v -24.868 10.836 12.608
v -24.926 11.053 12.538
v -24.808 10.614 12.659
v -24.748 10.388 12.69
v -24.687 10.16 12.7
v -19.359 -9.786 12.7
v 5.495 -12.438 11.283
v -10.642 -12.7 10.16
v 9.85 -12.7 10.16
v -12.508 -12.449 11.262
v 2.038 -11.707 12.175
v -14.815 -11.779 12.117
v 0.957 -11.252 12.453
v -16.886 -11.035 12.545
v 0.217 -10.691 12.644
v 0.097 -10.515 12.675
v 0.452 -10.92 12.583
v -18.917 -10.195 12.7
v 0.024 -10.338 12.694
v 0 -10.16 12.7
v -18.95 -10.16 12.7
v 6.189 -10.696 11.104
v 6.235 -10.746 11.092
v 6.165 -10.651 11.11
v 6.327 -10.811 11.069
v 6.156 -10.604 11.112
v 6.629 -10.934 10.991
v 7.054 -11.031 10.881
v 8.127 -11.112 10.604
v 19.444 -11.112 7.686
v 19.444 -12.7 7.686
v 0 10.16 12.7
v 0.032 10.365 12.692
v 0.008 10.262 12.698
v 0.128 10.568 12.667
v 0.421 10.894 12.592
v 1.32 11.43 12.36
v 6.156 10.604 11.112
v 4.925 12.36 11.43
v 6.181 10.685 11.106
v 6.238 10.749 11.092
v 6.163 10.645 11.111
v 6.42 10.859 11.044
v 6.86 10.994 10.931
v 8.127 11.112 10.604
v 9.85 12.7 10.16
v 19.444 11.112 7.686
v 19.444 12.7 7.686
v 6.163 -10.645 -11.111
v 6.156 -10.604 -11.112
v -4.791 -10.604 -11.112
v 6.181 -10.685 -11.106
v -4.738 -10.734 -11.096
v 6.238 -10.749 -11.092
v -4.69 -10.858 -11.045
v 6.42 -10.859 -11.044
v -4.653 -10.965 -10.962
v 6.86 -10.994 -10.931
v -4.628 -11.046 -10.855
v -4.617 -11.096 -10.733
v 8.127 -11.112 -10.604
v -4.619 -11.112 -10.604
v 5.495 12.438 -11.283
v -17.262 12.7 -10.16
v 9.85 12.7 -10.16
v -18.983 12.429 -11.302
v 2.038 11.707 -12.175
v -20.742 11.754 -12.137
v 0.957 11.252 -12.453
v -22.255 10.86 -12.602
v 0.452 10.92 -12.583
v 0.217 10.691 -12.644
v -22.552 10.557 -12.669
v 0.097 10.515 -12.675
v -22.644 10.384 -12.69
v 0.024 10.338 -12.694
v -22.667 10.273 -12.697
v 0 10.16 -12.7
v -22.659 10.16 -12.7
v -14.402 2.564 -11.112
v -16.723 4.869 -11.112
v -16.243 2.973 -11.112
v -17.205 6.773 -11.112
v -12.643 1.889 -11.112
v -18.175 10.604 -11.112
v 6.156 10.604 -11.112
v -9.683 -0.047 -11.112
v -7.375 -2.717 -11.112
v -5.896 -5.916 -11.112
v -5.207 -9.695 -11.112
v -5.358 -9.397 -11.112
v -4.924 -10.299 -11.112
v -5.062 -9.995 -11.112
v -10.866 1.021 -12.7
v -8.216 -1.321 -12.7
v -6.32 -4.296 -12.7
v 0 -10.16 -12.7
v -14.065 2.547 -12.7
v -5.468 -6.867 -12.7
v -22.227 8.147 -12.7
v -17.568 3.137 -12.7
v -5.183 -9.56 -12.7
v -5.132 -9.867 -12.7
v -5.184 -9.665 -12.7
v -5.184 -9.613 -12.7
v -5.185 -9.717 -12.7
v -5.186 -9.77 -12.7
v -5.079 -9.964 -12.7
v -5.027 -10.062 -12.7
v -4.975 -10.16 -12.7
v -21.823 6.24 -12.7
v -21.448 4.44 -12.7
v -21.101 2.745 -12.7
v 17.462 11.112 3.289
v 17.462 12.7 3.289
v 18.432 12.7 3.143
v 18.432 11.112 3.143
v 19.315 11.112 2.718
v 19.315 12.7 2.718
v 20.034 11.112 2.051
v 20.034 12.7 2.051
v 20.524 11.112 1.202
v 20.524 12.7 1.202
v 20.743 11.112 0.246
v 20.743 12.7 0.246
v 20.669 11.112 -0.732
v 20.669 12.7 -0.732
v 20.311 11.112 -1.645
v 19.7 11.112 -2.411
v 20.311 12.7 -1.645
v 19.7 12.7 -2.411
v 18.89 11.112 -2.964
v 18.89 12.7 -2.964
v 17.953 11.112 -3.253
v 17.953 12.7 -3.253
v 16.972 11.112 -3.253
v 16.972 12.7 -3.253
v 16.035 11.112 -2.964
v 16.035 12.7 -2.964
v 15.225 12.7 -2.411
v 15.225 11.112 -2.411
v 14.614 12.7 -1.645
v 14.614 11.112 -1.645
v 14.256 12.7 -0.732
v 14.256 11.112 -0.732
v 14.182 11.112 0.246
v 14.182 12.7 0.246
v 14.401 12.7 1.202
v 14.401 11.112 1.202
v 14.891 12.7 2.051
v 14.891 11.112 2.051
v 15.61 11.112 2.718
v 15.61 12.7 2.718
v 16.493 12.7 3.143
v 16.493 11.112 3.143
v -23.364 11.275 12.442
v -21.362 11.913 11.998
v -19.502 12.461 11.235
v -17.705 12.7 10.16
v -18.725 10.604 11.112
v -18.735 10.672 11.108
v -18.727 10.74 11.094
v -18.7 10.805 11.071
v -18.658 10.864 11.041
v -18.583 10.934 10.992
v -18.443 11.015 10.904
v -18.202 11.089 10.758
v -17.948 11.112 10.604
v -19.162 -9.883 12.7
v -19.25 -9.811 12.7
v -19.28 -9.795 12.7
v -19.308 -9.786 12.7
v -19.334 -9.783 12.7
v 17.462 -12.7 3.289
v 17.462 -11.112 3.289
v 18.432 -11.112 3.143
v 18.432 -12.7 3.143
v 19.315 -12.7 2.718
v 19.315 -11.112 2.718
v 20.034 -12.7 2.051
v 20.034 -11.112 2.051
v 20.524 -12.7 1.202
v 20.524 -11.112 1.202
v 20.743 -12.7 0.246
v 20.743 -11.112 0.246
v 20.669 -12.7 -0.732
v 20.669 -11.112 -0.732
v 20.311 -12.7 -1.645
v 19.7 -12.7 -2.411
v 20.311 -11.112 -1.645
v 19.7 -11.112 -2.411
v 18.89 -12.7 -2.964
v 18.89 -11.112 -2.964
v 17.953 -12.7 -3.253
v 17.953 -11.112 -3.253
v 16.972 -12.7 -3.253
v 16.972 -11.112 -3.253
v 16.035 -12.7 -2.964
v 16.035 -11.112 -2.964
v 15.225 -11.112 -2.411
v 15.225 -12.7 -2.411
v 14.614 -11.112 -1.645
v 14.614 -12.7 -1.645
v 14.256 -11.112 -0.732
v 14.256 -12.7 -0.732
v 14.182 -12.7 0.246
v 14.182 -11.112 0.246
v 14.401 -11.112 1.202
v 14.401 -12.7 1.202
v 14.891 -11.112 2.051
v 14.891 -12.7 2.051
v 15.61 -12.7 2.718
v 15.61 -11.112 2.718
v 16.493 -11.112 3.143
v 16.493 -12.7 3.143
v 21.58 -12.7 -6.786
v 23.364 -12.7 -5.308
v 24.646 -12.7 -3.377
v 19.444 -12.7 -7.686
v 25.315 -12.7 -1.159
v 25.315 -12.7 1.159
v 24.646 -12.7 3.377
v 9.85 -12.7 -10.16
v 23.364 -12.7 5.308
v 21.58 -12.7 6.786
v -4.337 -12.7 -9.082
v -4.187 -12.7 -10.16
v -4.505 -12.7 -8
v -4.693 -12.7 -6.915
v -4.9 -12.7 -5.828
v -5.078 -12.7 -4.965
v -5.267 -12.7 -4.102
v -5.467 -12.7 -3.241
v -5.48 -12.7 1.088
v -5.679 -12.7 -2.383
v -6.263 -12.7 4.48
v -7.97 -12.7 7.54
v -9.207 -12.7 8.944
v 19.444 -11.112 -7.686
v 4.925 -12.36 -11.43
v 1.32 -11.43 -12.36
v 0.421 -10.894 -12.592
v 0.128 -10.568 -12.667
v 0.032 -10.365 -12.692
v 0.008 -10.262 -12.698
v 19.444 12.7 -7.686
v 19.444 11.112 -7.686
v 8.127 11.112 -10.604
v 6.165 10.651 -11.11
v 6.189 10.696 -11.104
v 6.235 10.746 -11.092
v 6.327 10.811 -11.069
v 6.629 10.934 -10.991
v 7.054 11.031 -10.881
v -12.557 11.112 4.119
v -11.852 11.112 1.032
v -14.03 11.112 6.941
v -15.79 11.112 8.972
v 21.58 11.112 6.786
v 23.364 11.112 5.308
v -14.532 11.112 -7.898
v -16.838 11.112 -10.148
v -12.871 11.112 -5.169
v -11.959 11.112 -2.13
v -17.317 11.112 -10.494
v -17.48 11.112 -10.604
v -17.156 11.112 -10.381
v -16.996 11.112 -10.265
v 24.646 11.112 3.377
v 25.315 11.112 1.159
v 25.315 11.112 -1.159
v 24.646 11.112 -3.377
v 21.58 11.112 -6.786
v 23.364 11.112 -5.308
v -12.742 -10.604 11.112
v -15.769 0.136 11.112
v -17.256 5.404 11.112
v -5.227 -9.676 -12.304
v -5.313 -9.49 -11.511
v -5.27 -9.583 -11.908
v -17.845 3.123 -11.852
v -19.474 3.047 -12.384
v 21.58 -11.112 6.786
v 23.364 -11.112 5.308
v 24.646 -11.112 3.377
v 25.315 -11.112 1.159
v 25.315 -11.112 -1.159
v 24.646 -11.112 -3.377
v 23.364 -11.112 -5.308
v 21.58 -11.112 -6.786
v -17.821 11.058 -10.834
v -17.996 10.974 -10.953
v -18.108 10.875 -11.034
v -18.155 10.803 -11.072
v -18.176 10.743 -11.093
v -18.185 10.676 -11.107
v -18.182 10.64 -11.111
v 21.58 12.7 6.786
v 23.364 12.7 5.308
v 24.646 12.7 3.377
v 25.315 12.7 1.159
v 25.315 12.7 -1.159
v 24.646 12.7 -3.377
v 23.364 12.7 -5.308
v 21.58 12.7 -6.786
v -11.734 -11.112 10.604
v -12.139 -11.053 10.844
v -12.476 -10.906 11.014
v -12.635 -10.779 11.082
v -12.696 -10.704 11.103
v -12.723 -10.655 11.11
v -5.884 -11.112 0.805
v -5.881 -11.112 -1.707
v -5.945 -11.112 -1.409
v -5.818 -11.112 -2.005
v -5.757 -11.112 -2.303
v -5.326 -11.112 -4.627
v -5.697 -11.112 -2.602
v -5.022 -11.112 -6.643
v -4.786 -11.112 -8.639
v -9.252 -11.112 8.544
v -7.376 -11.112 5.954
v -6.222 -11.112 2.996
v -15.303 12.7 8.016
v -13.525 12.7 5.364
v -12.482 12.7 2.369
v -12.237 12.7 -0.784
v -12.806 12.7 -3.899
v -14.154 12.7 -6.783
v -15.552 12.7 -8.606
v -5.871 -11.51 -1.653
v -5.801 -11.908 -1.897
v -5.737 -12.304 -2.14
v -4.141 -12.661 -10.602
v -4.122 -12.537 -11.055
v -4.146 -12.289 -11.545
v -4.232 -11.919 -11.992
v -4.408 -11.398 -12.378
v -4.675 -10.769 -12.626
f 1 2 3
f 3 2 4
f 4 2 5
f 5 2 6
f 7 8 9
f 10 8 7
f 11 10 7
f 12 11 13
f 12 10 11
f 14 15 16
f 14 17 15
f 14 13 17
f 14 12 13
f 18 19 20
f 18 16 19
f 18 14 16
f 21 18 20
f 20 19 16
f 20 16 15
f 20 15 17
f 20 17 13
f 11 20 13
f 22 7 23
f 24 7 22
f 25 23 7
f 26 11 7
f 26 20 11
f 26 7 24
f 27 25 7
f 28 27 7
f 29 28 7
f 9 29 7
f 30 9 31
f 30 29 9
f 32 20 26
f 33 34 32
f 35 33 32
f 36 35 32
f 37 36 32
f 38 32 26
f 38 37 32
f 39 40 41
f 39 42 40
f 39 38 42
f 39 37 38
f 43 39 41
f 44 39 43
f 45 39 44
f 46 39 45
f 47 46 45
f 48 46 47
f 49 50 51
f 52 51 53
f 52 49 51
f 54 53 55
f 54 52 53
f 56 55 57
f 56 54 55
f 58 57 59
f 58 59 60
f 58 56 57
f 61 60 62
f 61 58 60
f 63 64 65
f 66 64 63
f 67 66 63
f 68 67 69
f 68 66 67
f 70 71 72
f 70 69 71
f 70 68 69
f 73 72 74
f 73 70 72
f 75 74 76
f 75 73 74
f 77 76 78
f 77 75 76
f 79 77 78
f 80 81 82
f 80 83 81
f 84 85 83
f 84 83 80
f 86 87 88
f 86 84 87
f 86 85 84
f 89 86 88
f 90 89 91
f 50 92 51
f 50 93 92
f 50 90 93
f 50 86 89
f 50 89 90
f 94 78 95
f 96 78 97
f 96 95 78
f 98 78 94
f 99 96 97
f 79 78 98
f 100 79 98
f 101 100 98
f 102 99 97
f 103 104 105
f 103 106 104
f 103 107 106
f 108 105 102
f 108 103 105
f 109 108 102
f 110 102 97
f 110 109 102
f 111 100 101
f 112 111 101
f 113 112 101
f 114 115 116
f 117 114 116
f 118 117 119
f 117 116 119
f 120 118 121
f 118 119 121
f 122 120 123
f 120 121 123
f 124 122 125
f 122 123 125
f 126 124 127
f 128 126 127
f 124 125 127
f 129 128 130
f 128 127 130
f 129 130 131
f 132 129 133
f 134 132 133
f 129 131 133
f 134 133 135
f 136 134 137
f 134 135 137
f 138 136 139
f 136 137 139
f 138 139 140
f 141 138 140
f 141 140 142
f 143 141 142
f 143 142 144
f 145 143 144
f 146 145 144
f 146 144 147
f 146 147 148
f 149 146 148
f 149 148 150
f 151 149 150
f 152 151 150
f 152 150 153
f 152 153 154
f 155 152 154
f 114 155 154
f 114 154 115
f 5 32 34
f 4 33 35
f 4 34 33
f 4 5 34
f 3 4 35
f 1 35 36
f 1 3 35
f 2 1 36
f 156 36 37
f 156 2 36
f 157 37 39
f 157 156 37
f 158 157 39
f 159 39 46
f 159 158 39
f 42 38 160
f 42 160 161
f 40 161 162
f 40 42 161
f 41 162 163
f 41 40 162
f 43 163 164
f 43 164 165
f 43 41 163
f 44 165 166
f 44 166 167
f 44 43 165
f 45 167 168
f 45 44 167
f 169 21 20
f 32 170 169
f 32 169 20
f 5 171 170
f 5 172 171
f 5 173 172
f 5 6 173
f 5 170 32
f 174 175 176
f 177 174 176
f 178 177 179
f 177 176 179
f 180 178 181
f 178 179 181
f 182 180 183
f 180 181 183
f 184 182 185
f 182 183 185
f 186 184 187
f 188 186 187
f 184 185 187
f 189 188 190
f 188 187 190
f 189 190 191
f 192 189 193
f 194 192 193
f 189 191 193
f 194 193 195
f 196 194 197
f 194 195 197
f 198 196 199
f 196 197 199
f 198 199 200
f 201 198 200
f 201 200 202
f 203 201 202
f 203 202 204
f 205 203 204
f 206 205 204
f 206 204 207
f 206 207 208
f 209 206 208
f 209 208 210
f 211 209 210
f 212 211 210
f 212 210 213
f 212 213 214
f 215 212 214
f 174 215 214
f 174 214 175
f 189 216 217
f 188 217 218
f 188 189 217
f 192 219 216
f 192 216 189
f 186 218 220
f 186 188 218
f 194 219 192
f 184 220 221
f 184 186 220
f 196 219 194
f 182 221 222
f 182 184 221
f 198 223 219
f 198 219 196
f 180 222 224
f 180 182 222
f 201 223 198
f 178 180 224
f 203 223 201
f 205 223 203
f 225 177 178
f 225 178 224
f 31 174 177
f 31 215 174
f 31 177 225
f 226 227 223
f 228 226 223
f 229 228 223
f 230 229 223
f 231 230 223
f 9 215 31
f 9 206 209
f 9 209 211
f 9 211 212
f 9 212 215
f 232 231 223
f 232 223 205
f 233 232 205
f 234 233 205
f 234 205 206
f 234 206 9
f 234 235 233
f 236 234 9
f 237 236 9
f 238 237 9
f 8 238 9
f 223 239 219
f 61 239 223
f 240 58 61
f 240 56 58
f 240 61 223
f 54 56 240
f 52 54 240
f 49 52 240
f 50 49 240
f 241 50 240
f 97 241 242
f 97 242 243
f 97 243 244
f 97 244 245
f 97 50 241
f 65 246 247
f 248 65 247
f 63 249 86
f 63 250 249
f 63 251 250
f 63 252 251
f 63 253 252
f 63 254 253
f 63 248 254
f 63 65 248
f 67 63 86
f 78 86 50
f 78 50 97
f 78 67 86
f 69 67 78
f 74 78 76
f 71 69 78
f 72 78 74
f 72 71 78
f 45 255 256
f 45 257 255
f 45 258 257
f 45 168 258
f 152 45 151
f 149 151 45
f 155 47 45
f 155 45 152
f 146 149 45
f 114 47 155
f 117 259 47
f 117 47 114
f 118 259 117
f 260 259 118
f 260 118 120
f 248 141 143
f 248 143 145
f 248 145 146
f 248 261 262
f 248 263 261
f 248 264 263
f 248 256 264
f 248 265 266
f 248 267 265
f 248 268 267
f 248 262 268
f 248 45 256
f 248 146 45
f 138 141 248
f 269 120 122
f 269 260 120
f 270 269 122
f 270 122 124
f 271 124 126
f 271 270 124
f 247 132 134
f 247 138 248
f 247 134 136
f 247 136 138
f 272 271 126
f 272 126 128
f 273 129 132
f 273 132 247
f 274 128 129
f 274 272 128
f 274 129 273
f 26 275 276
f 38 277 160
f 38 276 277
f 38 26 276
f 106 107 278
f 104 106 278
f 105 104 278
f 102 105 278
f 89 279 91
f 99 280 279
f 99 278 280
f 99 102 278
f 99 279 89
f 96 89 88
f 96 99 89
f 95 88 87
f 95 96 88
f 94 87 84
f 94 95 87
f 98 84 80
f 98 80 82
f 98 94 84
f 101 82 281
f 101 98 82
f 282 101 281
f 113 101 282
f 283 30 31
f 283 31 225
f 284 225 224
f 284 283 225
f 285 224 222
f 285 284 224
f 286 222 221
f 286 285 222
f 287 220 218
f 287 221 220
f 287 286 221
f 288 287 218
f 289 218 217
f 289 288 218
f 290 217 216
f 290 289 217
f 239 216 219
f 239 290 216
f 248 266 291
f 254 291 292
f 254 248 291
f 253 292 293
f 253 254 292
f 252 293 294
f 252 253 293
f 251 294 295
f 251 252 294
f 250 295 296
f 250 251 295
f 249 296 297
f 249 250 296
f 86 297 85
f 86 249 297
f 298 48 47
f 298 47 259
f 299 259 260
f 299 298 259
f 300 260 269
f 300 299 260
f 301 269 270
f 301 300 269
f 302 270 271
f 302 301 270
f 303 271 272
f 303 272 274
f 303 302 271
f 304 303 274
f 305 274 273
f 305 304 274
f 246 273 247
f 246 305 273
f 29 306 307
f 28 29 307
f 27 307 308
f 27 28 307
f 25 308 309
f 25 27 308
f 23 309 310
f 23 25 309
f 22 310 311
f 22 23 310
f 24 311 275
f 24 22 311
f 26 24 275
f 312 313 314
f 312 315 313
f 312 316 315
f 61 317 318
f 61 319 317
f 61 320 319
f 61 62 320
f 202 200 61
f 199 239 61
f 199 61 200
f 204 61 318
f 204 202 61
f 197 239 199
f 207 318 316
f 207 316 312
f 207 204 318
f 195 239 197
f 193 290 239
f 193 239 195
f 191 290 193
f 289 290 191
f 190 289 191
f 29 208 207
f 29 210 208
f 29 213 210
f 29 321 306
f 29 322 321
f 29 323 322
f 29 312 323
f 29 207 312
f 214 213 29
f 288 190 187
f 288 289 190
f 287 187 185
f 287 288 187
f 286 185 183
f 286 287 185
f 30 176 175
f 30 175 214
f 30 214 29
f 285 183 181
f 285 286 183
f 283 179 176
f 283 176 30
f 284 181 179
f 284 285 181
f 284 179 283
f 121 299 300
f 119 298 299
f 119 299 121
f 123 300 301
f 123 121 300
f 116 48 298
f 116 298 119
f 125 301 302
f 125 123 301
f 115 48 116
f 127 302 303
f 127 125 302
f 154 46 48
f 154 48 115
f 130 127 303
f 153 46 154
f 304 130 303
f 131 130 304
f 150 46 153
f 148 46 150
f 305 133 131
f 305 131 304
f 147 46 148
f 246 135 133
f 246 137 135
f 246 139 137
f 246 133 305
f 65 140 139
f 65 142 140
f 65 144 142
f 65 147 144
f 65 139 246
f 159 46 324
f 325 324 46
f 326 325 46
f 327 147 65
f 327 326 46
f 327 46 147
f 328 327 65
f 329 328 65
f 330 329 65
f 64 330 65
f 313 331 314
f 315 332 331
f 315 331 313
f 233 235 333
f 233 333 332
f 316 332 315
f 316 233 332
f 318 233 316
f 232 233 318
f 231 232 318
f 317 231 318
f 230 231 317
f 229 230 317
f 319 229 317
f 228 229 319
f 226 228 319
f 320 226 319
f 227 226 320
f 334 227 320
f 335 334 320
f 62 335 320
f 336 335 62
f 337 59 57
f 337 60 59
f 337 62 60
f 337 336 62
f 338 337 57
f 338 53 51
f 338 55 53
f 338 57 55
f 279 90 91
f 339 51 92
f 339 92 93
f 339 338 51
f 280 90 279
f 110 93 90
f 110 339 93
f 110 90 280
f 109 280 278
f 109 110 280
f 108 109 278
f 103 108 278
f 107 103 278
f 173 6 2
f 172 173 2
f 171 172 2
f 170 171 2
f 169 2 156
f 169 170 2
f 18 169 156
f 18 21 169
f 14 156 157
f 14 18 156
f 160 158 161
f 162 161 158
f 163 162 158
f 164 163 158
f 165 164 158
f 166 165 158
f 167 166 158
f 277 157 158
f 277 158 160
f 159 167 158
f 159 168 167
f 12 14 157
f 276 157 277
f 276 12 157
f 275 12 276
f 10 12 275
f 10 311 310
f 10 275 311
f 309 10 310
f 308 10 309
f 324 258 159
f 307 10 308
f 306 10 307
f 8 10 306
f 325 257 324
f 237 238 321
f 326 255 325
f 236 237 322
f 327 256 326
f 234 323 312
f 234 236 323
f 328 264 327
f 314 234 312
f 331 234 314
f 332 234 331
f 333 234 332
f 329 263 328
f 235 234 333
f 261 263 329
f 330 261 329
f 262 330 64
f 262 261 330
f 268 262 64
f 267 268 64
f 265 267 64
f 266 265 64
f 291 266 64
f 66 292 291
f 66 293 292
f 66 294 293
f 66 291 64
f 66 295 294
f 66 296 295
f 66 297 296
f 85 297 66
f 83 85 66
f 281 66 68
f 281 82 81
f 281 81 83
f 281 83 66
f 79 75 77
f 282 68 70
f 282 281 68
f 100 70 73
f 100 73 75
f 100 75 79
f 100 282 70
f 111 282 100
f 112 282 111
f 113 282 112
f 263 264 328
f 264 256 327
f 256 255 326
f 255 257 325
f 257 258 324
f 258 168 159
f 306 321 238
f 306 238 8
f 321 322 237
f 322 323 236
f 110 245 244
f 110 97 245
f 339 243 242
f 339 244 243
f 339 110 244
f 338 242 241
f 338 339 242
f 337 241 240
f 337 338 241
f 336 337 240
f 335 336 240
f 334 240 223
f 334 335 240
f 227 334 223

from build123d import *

# Parameters (mm, degrees)
BOSS_EXTRUDE1_DEPTH      = 25.4
BOSS_EXTRUDE1_DEPTH_BACK = 34.925
CUT_EXTRUDE4_DEPTH       = 63.941922635
CUT_EXTRUDE5_DEPTH       = 46.01339384
SKETCH14_R               = 3.2893
CUT_EXTRUDE6_DEPTH       = 46.01339384
CUT_EXTRUDE7_DEPTH       = 38.1
CUT_EXTRUDE7_DEPTH_BACK  = 25.4
SKETCH15_R               = 12.7
CUT_EXTRUDE21_DEPTH      = 14.732
CUT_EXTRUDE21_DEPTH_BACK = 25.4
SKETCH16_R               = 12.7
CUT_EXTRUDE22_DEPTH      = 16.51
CUT_EXTRUDE22_DEPTH_BACK = 12.7
SKETCH17_R               = 12.7
CUT_EXTRUDE23_DEPTH      = 16.51
CUT_EXTRUDE23_DEPTH_BACK = 12.7
SKETCH18_R               = 12.7
CUT_EXTRUDE24_DEPTH      = 12.7
CUT_EXTRUDE24_DEPTH_BACK = 12.7
SKETCH19_R               = 12.7
SKETCH20_W               = 58.413051364
SKETCH20_H               = 40.891520134
CUT_EXTRUDE25_DEPTH      = 51.98499249


with BuildPart() as part:
    # Sketch1 → Boss-Extrude1 (new, two sides: drawn at the far end of the back side and taken through both)
    with BuildSketch(Plane(origin=(0, 0, 0), x_dir=(0, 0, -1), z_dir=(1, 0, 0)).offset(-BOSS_EXTRUDE1_DEPTH_BACK)):
        with BuildLine():
            Line((-10.16, 12.7), (10.16, 12.7))
            ThreePointArc((10.16, 12.7), (11.956051224, 11.956051224), (12.7, 10.16))
            Line((12.7, 10.16), (12.7, -10.16))
            ThreePointArc((12.7, -10.16), (11.956051224, -11.956051224), (10.16, -12.7))
            Line((10.16, -12.7), (-10.16, -12.7))
            ThreePointArc((-10.16, -12.7), (-11.956051224, -11.956051224), (-12.7, -10.16))
            Line((-12.7, -10.16), (-12.7, 10.16))
            ThreePointArc((-12.7, 10.16), (-11.956051224, 11.956051224), (-10.16, 12.7))
        make_face()
    extrude(amount=BOSS_EXTRUDE1_DEPTH + BOSS_EXTRUDE1_DEPTH_BACK)

    # Sketch11 → Cut-Extrude4 (cut, through all)
    with BuildSketch(Plane(origin=(25.4, 0, 0), x_dir=(0, 0, -1), z_dir=(1, 0, 0))):
        with BuildLine():
            Line((-10.6045, 11.1125), (10.6045, 11.1125))
            ThreePointArc((10.6045, 11.1125), (10.963710245, 10.963710245), (11.1125, 10.6045))
            Line((11.1125, 10.6045), (11.1125, -10.6045))
            ThreePointArc((11.1125, -10.6045), (10.963710245, -10.963710245), (10.6045, -11.1125))
            Line((10.6045, -11.1125), (-10.6045, -11.1125))
            ThreePointArc((-10.6045, -11.1125), (-10.963710245, -10.963710245), (-11.1125, -10.6045))
            Line((-11.1125, -10.6045), (-11.1125, 10.6045))
            ThreePointArc((-11.1125, 10.6045), (-10.963710245, 10.963710245), (-10.6045, 11.1125))
        make_face()
    extrude(amount=-CUT_EXTRUDE4_DEPTH, mode=Mode.SUBTRACT)

    # Sketch12 → Cut-Extrude5 (cut, through all)
    with BuildSketch(Plane(origin=(0, 12.7, 0), x_dir=(1, 0, 0), z_dir=(0, 1, 0))):
        with BuildLine():
            Line((50.8, 12.7), (0, 12.7))
            Line((0, 12.7), (19.444424463, 7.686083637))
            ThreePointArc((19.444424463, 7.686083637), (25.4, 0), (19.444424463, -7.686083637))
            Line((19.444424463, -7.686083637), (0, -12.7))
            Line((0, -12.7), (50.8, -12.7))
            Line((50.8, -12.7), (50.8, 12.7))
        make_face()
    extrude(amount=-CUT_EXTRUDE5_DEPTH, mode=Mode.SUBTRACT)

    # Sketch14 → Cut-Extrude6 (cut, through all)
    with BuildSketch(Plane(origin=(0, 12.7, 0), x_dir=(1, 0, 0), z_dir=(0, 1, 0))):
        with Locations((17.4625, 0)):
            Circle(SKETCH14_R)
    extrude(amount=-CUT_EXTRUDE6_DEPTH, mode=Mode.SUBTRACT)

    # Sketch15 → Cut-Extrude7 (cut, two sides: drawn at the far end of the back side and taken through both)
    with BuildSketch(Plane(origin=(-18.580944095, -12.7, 0.022320862), x_dir=(0.966128643141705, 0.25805311522873825, -0.0020086368292127157), z_dir=(-0.2580609325356477, 0.9660993767043436, -0.007519935525706381)).offset(-CUT_EXTRUDE7_DEPTH_BACK)):
        Circle(SKETCH15_R)
    extrude(amount=CUT_EXTRUDE7_DEPTH + CUT_EXTRUDE7_DEPTH_BACK, mode=Mode.SUBTRACT)

    # Sketch16 → Cut-Extrude21 (cut, two sides: drawn at the far end of the back side and taken through both)
    with BuildSketch(Plane(origin=(-34.925, -13.993557422, 0), x_dir=(0, 0, -1), z_dir=(0.9661266940476224, 0.2580682294444863, 0)).offset(-CUT_EXTRUDE21_DEPTH_BACK)):
        Circle(SKETCH16_R)
    extrude(amount=CUT_EXTRUDE21_DEPTH + CUT_EXTRUDE21_DEPTH_BACK, mode=Mode.SUBTRACT)

    # Sketch17 → Cut-Extrude22 (cut, two sides: drawn at the far end of the back side and taken through both)
    with BuildSketch(Plane(origin=(-29.427114325, -12.623836713, -12.7), x_dir=(0.7903344181486555, -0.13152541034589554, -0.5983916559603502), z_dir=(0.6126756952006717, 0.1696640808045107, 0.7719084092009455)).offset(-CUT_EXTRUDE22_DEPTH_BACK)):
        Circle(SKETCH17_R)
    extrude(amount=CUT_EXTRUDE22_DEPTH + CUT_EXTRUDE22_DEPTH_BACK, mode=Mode.SUBTRACT)


with BuildPart() as cut_extrude22_piece_1:
    # of the separate pieces the step leaves, piece 1, a body of its own (cut_extrude22_pieces)
    add(part.part.solids().sort_by_distance((-34.925, 10.16, 12.7))[0])


with BuildPart() as cut_extrude22_piece_2:
    # of the separate pieces the step leaves, piece 2, a body of its own (cut_extrude22_pieces)
    add(part.part.solids().sort_by_distance((-28.657579441, 0.553532164, -11.1125))[0])


with BuildPart() as cut_extrude23_tool:
    # Sketch18 → Cut-Extrude23 (new, two sides: drawn at the far end of the back side and taken through both)
    with BuildSketch(Plane(origin=(-17.958929348, -9.56049708, -12.7), x_dir=(0.9940833845942288, -0.002324974713650623, 0.10859474649477009), z_dir=(-0.10861963208224606, -0.02127809391484378, 0.9938556324968274)).offset(-CUT_EXTRUDE23_DEPTH_BACK)):
        Circle(SKETCH18_R)
    extrude(amount=CUT_EXTRUDE23_DEPTH + CUT_EXTRUDE23_DEPTH_BACK)


with BuildPart() as cut_extrude22_piece_1_1:
    add(cut_extrude22_piece_1.part)

    # Cut-Extrude23: cut by cut_extrude23_tool
    add(cut_extrude23_tool.part, mode=Mode.SUBTRACT)

    # Sketch19 → Cut-Extrude24 (cut, two sides: drawn at the far end of the back side and taken through both)
    with BuildSketch(Plane(origin=(-16.211316351, -16.081156217, -12.7), x_dir=(0.9763290145154149, 0.09548845507502933, 0.1940711476823458), z_dir=(-0.21629067343590844, 0.43103175814295297, 0.8760308031438372)).offset(-CUT_EXTRUDE24_DEPTH_BACK)):
        Circle(SKETCH19_R)
    extrude(amount=CUT_EXTRUDE24_DEPTH + CUT_EXTRUDE24_DEPTH_BACK, mode=Mode.SUBTRACT)


with BuildPart() as cut_extrude22_piece_2_1:
    add(cut_extrude22_piece_2.part)

    # Cut-Extrude23: cut by cut_extrude23_tool
    add(cut_extrude23_tool.part, mode=Mode.SUBTRACT)


with BuildPart() as cut_extrude25_tool:
    # Sketch20 → Cut-Extrude25 (new, through all)
    with BuildSketch(Plane(origin=(-20.509915766, -5.478533696, 0), x_dir=(0.25806093253564766, -0.9660993767043435, 0.007519935525706381), z_dir=(0.9661266940476224, 0.2580682294444864, 0))):
        Rectangle(SKETCH20_W, SKETCH20_H)
    extrude(amount=-CUT_EXTRUDE25_DEPTH)


with BuildPart() as cut_extrude22_piece_1_2:
    add(cut_extrude22_piece_1_1.part)

    # Cut-Extrude25: cut by cut_extrude25_tool
    add(cut_extrude25_tool.part, mode=Mode.SUBTRACT)


with BuildPart() as cut_extrude22_piece_2_2:
    add(cut_extrude22_piece_2_1.part)

    # Cut-Extrude25: cut by cut_extrude25_tool
    add(cut_extrude25_tool.part, mode=Mode.SUBTRACT)


solid = cut_extrude22_piece_1_2.part
